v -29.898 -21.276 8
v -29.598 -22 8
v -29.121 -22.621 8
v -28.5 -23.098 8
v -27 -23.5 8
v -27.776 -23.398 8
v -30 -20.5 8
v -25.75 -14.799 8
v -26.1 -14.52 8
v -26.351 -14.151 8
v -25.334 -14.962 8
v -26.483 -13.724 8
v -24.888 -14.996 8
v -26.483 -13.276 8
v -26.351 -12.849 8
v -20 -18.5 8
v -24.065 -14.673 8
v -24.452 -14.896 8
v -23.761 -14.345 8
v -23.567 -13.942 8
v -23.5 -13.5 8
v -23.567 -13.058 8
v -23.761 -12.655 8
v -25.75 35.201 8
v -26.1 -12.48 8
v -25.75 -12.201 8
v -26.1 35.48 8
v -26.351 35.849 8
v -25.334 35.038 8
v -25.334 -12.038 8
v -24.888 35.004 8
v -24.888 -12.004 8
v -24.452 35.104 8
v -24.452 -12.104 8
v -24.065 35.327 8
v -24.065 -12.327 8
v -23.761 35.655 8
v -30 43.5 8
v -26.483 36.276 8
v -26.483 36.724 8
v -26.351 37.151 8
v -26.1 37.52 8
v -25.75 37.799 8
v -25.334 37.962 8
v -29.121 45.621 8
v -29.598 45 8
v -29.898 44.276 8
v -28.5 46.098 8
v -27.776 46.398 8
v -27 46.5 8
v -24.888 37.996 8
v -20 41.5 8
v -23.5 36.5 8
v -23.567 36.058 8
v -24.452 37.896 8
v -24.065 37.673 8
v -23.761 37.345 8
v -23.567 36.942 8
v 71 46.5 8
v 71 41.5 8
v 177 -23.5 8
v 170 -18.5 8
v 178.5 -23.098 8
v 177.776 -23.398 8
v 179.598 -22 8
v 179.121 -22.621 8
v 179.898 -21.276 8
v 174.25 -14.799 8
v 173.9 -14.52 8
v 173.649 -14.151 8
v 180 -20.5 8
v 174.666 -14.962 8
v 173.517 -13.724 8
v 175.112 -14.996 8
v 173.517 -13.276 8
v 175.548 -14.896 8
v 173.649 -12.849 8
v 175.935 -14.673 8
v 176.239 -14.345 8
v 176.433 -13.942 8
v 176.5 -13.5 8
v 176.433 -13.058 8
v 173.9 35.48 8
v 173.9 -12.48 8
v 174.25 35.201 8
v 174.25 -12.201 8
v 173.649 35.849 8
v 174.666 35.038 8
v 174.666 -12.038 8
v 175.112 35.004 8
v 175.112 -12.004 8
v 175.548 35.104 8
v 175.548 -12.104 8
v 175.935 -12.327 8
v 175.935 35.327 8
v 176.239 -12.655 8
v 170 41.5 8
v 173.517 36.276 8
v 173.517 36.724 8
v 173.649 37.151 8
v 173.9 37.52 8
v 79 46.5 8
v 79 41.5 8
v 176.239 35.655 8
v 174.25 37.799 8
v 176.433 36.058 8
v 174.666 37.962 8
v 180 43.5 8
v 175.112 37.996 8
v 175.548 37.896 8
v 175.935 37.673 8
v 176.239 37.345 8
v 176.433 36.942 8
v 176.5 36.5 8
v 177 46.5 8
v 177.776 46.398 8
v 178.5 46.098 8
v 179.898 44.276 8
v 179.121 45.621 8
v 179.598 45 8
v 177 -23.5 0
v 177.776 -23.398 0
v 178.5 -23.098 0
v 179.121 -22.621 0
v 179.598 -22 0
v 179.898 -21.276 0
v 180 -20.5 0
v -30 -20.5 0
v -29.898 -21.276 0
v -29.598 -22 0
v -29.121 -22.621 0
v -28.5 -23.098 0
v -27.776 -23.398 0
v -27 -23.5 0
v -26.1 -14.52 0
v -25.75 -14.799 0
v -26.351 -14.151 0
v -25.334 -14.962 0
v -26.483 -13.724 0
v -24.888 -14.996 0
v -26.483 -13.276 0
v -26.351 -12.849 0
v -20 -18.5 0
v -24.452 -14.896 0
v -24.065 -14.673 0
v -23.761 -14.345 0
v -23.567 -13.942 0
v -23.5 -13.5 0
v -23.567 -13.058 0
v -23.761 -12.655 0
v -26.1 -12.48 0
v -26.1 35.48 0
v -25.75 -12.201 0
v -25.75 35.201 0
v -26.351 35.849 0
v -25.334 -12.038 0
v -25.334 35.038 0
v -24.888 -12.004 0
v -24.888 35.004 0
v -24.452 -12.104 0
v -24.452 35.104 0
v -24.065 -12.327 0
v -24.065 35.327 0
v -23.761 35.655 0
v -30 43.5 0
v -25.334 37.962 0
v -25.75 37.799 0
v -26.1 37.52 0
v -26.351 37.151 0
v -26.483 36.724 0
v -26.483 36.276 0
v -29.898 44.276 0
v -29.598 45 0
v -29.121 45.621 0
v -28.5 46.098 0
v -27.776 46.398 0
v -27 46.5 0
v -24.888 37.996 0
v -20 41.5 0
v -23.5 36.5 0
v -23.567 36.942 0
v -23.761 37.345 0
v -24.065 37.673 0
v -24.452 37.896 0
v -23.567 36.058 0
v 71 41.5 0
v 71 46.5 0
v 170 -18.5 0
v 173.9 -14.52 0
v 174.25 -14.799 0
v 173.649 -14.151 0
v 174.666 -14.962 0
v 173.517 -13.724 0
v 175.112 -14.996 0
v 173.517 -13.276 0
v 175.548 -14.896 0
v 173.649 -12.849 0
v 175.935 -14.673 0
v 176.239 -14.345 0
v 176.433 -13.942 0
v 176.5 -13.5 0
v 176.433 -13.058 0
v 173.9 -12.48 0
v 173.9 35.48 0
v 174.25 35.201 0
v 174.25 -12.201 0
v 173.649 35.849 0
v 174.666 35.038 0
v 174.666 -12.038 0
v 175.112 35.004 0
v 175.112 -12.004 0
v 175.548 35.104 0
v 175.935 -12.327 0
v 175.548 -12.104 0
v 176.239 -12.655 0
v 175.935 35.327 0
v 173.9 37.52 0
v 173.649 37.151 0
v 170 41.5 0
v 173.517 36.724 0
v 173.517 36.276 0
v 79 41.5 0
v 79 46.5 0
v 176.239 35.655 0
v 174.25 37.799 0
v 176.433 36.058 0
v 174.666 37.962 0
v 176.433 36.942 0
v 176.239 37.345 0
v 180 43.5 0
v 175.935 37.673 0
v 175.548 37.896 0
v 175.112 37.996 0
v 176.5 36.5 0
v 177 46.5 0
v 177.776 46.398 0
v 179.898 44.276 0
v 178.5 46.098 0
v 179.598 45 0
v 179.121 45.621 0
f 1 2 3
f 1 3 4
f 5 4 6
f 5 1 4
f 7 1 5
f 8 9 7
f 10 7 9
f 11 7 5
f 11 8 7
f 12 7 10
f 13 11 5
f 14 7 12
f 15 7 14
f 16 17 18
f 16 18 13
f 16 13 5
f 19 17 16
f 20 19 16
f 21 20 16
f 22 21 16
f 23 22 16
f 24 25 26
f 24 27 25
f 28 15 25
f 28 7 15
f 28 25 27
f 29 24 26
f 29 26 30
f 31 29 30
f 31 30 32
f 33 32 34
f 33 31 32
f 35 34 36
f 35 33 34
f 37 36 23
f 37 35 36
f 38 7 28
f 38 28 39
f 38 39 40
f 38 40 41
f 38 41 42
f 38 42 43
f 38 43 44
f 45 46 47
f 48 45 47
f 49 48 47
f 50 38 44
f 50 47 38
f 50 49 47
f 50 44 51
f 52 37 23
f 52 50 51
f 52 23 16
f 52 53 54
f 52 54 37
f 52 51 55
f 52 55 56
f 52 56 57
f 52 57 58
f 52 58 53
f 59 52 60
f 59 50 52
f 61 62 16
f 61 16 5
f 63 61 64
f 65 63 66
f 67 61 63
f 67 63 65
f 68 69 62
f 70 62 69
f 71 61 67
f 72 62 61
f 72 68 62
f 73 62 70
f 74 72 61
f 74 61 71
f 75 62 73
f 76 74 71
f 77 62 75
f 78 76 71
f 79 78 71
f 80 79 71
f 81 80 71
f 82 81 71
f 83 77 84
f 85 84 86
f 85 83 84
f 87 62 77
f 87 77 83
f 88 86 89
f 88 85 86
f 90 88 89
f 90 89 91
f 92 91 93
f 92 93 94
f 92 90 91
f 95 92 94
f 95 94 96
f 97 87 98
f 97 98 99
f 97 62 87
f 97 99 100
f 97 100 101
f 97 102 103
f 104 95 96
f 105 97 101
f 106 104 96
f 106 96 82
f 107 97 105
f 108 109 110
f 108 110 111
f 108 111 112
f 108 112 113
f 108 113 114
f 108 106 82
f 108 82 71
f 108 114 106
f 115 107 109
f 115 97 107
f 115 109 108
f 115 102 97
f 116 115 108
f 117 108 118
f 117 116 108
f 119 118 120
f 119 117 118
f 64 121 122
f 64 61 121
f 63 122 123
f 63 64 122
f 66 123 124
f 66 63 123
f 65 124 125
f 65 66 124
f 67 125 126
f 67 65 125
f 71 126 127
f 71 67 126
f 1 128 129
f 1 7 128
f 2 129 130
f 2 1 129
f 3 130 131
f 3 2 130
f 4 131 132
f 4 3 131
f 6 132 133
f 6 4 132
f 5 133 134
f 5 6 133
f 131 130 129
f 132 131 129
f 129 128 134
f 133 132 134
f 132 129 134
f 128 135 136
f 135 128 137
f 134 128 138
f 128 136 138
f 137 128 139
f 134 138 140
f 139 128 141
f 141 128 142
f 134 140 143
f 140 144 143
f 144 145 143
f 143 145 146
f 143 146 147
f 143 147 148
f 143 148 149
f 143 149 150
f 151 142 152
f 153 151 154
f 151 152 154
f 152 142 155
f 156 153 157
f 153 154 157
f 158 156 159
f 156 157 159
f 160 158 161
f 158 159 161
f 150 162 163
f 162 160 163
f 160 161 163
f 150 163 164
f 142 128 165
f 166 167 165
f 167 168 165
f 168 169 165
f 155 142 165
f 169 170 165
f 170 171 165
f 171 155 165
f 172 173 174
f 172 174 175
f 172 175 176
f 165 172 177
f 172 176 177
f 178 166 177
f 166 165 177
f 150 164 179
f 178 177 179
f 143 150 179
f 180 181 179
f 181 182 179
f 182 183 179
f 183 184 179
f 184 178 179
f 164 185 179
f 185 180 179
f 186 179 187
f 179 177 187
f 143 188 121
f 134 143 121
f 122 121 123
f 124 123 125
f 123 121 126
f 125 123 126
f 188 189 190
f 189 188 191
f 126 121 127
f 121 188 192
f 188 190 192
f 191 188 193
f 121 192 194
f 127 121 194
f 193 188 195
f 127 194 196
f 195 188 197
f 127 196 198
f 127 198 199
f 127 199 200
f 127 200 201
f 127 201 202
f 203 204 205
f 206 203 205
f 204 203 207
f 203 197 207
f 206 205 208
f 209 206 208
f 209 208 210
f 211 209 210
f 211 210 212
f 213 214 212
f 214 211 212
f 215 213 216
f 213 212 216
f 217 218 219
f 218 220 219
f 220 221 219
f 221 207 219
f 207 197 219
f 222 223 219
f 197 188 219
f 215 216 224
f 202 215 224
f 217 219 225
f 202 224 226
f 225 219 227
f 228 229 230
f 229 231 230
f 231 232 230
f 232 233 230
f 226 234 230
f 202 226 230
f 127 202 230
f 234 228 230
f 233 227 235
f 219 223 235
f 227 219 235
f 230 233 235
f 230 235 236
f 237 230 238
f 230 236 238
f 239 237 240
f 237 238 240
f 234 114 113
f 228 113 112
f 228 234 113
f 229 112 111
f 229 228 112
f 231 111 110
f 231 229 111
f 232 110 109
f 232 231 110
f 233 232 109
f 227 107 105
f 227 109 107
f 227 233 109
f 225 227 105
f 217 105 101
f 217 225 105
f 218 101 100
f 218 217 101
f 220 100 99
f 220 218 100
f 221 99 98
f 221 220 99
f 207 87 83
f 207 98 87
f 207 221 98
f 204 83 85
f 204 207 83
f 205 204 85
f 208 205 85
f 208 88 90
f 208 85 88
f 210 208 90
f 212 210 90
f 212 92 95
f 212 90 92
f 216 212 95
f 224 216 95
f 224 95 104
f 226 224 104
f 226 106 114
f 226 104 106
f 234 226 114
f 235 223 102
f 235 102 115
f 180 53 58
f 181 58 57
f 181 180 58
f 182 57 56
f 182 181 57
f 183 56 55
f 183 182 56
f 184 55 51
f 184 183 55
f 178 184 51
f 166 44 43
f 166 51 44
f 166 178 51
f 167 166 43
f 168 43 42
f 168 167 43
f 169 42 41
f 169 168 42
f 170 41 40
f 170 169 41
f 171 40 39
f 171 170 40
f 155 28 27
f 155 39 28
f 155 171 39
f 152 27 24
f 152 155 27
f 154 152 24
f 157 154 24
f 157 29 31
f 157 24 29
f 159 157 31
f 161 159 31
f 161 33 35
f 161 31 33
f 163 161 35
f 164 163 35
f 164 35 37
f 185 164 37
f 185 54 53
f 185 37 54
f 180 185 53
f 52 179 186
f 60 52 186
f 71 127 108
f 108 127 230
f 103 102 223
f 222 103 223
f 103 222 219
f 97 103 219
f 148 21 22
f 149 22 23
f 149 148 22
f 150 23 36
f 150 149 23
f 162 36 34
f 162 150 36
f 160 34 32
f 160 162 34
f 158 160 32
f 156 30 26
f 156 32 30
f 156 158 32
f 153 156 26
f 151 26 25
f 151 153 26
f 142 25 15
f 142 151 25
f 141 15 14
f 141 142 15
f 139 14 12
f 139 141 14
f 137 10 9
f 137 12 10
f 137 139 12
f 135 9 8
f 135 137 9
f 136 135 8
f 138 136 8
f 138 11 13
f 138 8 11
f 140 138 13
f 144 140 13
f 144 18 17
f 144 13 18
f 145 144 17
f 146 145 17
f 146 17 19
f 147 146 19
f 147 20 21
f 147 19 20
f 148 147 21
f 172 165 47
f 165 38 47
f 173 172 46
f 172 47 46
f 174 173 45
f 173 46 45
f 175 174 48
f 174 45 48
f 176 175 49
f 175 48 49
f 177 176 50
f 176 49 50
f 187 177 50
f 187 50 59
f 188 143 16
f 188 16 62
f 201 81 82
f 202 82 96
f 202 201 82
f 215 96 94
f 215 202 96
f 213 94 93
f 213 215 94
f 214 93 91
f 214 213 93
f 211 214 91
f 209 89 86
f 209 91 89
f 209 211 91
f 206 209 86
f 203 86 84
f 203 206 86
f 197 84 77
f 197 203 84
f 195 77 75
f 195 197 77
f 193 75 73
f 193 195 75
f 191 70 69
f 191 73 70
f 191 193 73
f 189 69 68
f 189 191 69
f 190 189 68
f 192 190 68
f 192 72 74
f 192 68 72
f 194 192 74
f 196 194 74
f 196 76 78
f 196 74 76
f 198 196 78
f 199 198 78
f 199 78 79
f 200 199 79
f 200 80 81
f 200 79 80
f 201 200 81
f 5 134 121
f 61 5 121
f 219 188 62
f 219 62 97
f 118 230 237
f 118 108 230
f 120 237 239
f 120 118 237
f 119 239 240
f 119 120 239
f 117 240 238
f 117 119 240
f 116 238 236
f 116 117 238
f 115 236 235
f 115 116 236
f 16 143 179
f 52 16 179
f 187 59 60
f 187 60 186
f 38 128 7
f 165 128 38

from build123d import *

# Parameters (mm, degrees)
SKETCH_1_W          = 210
SKETCH_1_H          = 70
EXTRUDE_1_DEPTH     = 8
SKETCH_2_W          = 190
SKETCH_2_H          = 60
CUT_EXTRUDE_1_DEPTH = 10
SKETCH_3_R          = 1.5
CUT_EXTRUDE_2_DEPTH = 10
SKETCH_4_W          = 8
SKETCH_4_H          = 10
CUT_EXTRUDE_3_DEPTH = 5
FILLET_1_R          = 3


with BuildPart() as part:
    # 草图1 → 凸台-拉伸1 (new body)
    with BuildSketch(Plane.XY):
        with Locations((75, 11.5)):
            Rectangle(SKETCH_1_W, SKETCH_1_H)
    extrude(amount=EXTRUDE_1_DEPTH)

    # 草图2 → 切除-拉伸1 (cut)
    with BuildSketch(Plane.XY):
        with Locations((75, 11.5)):
            Rectangle(SKETCH_2_W, SKETCH_2_H)
    extrude(amount=CUT_EXTRUDE_1_DEPTH, mode=Mode.SUBTRACT)

    # 草图3 → 切除-拉伸2 (cut)
    with BuildSketch(Plane.XY):
        with Locations((-25, 36.5)):
            Circle(SKETCH_3_R)
        with Locations((175, 36.5)):
            Circle(SKETCH_3_R)
        with Locations((-25, -13.5)):
            Circle(SKETCH_3_R)
        with Locations((175, -13.5)):
            Circle(SKETCH_3_R)
    extrude(amount=CUT_EXTRUDE_2_DEPTH, mode=Mode.SUBTRACT)

    # 草图4 → 切除-拉伸3 (cut)
    with BuildSketch(Plane(origin=(0, 46.5, 0), x_dir=(1, 0, 0), z_dir=(0, 1, 0))):
        with Locations((75, -5)):
            Rectangle(SKETCH_4_W, SKETCH_4_H)
    extrude(amount=-CUT_EXTRUDE_3_DEPTH, mode=Mode.SUBTRACT)

    # 圆角1
    fillet_1_edges = [part.edges().sort_by_distance(p)[0] for p in [
        (-30, 46.5, 4),
        (180, 46.5, 4),
        (180, -23.5, 4),
        (-30, -23.5, 4),
    ]]
    fillet(fillet_1_edges, radius=FILLET_1_R)


solid = part.part
